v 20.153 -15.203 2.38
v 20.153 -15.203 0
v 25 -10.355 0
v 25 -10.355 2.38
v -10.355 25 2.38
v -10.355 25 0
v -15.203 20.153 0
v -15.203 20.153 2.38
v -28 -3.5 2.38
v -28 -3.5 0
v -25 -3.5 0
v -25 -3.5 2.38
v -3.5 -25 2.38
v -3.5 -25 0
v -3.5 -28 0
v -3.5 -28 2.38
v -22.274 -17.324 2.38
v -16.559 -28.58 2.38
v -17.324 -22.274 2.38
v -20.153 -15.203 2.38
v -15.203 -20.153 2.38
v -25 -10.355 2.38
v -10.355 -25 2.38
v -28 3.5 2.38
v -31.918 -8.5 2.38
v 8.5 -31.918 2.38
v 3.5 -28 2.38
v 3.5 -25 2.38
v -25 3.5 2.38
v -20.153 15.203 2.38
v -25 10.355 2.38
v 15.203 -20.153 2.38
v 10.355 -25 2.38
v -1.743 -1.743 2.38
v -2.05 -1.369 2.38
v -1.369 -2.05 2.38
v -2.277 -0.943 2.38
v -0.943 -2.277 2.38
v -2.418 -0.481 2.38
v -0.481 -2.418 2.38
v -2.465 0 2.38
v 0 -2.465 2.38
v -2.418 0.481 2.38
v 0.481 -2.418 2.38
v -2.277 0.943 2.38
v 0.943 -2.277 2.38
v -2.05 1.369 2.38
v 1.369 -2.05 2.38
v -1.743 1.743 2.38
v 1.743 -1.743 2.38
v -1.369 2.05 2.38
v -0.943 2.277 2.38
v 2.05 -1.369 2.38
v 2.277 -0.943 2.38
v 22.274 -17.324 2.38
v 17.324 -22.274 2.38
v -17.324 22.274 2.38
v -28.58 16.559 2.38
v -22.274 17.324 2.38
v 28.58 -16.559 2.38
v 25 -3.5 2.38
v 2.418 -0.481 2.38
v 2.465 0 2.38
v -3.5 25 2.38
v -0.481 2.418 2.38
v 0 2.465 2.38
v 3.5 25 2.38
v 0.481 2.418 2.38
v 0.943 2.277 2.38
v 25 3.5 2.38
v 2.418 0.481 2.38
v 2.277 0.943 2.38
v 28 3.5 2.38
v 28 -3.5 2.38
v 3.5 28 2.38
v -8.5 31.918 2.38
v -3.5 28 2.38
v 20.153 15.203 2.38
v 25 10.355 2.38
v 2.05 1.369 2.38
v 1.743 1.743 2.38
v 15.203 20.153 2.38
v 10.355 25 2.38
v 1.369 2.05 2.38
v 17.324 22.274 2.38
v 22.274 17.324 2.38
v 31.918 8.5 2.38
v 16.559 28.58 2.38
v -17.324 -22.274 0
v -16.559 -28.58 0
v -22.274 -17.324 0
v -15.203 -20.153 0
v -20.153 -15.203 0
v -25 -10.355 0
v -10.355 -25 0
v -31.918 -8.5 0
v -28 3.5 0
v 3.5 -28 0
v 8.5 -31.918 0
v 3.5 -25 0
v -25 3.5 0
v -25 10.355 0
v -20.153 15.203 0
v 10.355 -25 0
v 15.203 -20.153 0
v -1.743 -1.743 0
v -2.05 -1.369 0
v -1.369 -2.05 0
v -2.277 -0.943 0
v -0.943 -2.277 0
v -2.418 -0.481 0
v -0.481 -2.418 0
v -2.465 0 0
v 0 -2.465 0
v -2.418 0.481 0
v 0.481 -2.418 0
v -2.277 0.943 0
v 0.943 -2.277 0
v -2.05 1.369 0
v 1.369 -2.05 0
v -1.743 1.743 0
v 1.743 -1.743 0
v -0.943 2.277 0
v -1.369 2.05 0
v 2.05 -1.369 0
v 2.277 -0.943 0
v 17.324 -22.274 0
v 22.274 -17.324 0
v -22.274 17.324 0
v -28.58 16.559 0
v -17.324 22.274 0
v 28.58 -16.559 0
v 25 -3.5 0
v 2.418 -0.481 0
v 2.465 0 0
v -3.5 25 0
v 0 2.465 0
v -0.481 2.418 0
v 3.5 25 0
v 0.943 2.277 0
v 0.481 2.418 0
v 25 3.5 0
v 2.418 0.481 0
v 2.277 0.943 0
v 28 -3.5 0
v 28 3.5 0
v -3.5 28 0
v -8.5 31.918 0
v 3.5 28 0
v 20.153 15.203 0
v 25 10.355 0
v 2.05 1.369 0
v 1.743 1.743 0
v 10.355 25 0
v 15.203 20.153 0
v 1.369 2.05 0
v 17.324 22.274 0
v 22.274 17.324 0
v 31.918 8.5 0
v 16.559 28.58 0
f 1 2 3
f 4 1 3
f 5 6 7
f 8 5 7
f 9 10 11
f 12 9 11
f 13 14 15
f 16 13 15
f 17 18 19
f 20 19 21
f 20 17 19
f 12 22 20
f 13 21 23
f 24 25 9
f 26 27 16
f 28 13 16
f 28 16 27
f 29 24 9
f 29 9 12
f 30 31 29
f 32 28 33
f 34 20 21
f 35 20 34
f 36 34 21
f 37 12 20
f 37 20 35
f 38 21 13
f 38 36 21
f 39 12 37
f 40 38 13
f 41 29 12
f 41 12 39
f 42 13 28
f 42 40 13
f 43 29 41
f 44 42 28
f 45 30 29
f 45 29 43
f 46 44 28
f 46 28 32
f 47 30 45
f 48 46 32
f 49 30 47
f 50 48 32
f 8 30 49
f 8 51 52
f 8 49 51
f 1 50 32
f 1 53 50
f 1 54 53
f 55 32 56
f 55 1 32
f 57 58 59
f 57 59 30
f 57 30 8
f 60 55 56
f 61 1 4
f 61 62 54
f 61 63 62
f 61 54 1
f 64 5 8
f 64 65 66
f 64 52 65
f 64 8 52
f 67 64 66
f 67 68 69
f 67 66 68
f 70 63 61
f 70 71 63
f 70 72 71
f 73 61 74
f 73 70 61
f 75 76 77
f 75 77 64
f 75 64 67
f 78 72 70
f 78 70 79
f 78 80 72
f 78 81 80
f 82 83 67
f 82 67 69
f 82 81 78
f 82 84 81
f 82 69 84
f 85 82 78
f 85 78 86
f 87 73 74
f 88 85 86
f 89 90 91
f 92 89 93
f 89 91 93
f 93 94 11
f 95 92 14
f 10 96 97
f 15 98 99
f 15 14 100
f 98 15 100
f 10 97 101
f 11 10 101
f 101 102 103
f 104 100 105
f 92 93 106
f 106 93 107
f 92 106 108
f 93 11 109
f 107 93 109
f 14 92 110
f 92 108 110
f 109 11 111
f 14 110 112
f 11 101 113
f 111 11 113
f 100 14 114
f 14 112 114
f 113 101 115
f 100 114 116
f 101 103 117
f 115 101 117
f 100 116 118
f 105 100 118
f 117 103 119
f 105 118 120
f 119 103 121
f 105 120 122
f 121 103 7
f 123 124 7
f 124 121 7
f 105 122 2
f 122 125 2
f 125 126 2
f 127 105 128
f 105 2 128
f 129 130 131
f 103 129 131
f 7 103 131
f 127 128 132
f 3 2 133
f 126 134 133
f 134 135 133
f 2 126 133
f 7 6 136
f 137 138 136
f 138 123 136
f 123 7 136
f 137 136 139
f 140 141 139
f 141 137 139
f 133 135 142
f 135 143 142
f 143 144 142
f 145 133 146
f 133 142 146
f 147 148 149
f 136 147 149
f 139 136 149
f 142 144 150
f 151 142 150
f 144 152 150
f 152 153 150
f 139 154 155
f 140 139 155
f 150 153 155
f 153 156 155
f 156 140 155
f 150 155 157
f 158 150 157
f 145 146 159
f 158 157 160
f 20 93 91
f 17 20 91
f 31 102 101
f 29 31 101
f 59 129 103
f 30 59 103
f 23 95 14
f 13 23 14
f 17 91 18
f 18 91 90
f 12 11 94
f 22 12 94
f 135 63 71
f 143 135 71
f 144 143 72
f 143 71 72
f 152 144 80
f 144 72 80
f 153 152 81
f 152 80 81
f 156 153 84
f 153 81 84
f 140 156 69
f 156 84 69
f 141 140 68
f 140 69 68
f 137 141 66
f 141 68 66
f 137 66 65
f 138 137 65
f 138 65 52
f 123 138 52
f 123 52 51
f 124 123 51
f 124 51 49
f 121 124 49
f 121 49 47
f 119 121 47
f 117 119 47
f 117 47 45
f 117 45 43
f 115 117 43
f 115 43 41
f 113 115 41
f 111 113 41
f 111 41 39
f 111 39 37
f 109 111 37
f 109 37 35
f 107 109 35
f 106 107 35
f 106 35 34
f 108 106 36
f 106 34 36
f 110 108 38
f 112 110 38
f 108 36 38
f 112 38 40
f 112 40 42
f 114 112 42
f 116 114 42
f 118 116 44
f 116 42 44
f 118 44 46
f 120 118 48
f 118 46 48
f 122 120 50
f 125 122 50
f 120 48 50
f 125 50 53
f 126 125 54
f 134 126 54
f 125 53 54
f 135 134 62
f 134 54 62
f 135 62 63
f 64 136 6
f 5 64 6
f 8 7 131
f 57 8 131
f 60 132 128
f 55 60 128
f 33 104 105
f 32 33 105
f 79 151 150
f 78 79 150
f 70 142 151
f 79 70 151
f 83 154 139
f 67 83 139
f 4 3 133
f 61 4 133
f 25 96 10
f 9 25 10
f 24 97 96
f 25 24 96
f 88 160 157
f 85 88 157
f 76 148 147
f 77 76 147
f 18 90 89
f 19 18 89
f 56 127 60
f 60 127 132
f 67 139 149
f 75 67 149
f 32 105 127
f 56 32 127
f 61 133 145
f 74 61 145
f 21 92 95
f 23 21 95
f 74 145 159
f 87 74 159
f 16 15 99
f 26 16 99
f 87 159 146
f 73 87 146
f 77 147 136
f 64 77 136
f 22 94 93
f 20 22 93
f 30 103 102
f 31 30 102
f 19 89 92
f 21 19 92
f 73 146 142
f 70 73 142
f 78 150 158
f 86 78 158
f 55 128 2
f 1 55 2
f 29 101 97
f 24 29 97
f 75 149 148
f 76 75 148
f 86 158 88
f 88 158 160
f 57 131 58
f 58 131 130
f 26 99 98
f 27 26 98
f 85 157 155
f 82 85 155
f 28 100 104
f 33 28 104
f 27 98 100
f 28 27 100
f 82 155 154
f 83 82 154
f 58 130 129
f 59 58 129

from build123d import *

# Parameters (mm, degrees)
F1_DEPTH = 2.38
F2_R     = 2.465
F3_DEPTH = 25


with BuildPart() as f1:
    # F0 (on Top) → F1 (new body)
    with BuildSketch(Plane.XY):
        Polygon((-17.67767, 17.67767), (0, 0), (-10.355339, 25), (-15.202796, 20.152543), align=None)
        Polygon((0, 25), (0, 0), (10.355339, 25), (3.5, 25), align=None)
        Polygon((-10.355339, 25), (0, 0), (0, 25), (-3.5, 25), align=None)
        Polygon((-25, 10.355339), (0, 0), (-17.67767, 17.67767), (-20.152543, 15.202796), align=None)
        Polygon((-25, 0), (0, 0), (-25, 10.355339), (-25, 3.5), align=None)
        Polygon((-25, -10.355339), (0, 0), (-25, 0), (-25, -3.5), align=None)
        Polygon((-17.67767, -17.67767), (0, 0), (-25, -10.355339), (-20.152543, -15.202796), align=None)
        Polygon((-10.355339, -25), (0, 0), (-17.67767, -17.67767), (-15.202796, -20.152543), align=None)
        Polygon((0, -25), (0, 0), (-10.355339, -25), (-3.5, -25), align=None)
        Polygon((10.355339, -25), (0, 0), (0, -25), (3.5, -25), align=None)
        Polygon((17.67767, -17.67767), (0, 0), (10.355339, -25), (15.202796, -20.152543), align=None)
        Polygon((25, -10.355339), (0, 0), (17.67767, -17.67767), (20.152543, -15.202796), align=None)
        Polygon((25, 0), (0, 0), (25, -10.355339), (25, -3.5), align=None)
        Polygon((25, 10.355339), (0, 0), (25, 0), (25, 3.5), align=None)
        Polygon((17.67767, 17.67767), (0, 0), (25, 10.355339), (20.152543, 15.202796), align=None)
        Polygon((10.355339, 25), (0, 0), (17.67767, 17.67767), (15.202796, 20.152543), align=None)
        Polygon((-3.5, 25), (0, 25), (3.5, 25), (3.5, 28), (-3.5, 28), align=None)
        Polygon((-20.152543, 15.202796), (-17.67767, 17.67767), (-15.202796, 20.152543), (-17.324116, 22.273864), (-22.273864, 17.324116), align=None)
        Polygon((-25, -3.5), (-25, 0), (-25, 3.5), (-28, 3.5), (-28, -3.5), align=None)
        Polygon((-15.202796, -20.152543), (-17.67767, -17.67767), (-20.152543, -15.202796), (-22.273864, -17.324116), (-17.324116, -22.273864), align=None)
        Polygon((3.5, -25), (0, -25), (-3.5, -25), (-3.5, -28), (3.5, -28), align=None)
        Polygon((20.152543, -15.202796), (17.67767, -17.67767), (15.202796, -20.152543), (17.324116, -22.273864), (22.273864, -17.324116), align=None)
        Polygon((25, 3.5), (25, 0), (25, -3.5), (28, -3.5), (28, 3.5), align=None)
        Polygon((15.202796, 20.152543), (17.67767, 17.67767), (20.152543, 15.202796), (22.273864, 17.324116), (17.324116, 22.273864), align=None)
        Polygon((-8.5, 31.91786), (-3.5, 28), (3.5, 28), align=None)
        Polygon((-22.273864, 17.324116), (-17.324116, 22.273864), (-28.579743, 16.558928), align=None)
        Polygon((16.558928, 28.579743), (17.324116, 22.273864), (22.273864, 17.324116), align=None)
        Polygon((-28, -3.5), (-28, 3.5), (-31.91786, -8.5), align=None)
        Polygon((-17.324116, -22.273864), (-22.273864, -17.324116), (-16.558928, -28.579743), align=None)
        Polygon((3.5, -28), (-3.5, -28), (8.5, -31.91786), align=None)
        Polygon((22.273864, -17.324116), (17.324116, -22.273864), (28.579743, -16.558928), align=None)
        Polygon((28, 3.5), (28, -3.5), (31.91786, 8.5), align=None)
    extrude(amount=F1_DEPTH)

    # F2 (on face) → F3 (cut)
    with BuildSketch(Plane.XY.offset(2.38)):
        Circle(F2_R)
    extrude(amount=-F3_DEPTH, mode=Mode.SUBTRACT)


solid = f1.part
